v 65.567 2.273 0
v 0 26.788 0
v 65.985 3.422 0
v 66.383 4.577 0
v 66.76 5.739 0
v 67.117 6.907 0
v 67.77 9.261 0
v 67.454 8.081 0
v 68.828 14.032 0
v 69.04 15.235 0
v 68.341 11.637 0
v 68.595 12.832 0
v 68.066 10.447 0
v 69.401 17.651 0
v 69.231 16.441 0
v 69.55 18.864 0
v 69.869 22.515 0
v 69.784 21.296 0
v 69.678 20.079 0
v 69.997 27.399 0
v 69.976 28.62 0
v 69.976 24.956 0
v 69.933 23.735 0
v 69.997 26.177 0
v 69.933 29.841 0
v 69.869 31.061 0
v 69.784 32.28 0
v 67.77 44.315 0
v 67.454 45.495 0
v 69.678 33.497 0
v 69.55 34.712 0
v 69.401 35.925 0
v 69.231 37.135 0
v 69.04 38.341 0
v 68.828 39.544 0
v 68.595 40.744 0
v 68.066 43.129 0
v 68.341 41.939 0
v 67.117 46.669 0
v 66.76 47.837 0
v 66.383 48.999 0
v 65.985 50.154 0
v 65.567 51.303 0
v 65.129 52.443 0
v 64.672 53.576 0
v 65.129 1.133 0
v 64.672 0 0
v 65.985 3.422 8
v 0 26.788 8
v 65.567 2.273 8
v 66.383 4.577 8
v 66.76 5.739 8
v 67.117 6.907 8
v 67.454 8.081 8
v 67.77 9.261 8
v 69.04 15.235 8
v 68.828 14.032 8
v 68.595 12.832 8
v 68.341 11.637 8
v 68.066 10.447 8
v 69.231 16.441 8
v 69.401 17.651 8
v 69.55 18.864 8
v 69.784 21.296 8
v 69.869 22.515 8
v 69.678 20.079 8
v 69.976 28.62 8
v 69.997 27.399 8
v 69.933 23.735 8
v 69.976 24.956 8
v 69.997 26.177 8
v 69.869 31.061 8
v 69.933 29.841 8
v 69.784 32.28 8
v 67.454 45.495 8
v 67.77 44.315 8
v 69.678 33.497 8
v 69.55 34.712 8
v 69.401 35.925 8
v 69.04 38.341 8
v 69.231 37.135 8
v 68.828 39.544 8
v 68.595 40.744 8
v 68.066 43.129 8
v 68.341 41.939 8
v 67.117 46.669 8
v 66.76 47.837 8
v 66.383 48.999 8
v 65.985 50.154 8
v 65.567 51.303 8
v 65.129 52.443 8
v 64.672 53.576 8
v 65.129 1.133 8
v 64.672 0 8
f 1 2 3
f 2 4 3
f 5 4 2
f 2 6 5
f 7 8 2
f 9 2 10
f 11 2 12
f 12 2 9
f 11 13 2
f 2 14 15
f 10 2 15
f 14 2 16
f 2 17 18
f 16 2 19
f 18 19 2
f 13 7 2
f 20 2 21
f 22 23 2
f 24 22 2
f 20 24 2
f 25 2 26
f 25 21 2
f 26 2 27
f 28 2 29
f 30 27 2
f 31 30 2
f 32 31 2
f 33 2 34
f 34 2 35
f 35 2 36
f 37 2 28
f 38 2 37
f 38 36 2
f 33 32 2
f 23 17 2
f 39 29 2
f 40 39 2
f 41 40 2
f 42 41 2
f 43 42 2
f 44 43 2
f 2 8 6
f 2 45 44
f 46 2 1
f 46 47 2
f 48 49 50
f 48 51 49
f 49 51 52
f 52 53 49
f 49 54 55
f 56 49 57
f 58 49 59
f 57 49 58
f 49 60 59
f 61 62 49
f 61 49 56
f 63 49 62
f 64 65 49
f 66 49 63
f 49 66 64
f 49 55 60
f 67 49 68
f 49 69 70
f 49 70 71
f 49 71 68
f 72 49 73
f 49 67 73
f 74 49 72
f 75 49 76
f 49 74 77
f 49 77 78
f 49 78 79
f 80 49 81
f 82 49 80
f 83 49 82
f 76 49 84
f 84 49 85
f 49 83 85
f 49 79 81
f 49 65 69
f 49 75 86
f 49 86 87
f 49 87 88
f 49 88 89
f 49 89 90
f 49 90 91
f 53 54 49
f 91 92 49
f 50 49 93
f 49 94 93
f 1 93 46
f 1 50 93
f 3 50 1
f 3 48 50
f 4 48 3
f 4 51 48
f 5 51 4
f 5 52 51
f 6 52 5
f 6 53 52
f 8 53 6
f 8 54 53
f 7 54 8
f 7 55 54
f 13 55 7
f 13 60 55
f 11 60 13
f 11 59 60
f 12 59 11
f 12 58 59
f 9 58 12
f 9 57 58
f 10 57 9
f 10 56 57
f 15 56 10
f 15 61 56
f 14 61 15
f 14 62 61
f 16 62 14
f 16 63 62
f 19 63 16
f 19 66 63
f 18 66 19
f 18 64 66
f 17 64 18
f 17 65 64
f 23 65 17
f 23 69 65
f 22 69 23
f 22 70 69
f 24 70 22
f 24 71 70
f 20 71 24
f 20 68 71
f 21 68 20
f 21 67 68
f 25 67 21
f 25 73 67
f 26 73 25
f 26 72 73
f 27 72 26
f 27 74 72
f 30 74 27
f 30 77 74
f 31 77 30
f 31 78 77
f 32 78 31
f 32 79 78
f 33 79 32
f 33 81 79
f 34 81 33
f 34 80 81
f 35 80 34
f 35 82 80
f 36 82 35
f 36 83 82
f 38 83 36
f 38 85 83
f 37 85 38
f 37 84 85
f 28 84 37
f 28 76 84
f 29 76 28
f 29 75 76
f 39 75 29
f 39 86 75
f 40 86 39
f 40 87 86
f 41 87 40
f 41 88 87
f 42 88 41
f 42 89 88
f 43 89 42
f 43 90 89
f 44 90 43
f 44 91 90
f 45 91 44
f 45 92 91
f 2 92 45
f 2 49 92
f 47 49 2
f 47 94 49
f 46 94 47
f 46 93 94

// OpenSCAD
$fn = 32;

// ----------------------------------------------------------------------
// Arc profile plate: sector, 47 points
// ----------------------------------------------------------------------

// --- parameters (mm) ---
sector_angle = 45;        // sector angle, degrees
sector_r = 70;            // outer radius
arc_step = 1;             // sampling step of the arc, degrees
plate_t = 8;              // plate thickness, Z
fit_tol = 0.1;            // declared fit tolerance (prompt contract)
free_tol = 0.5;           // declared free tolerance (prompt contract)

bbox_x = 2 * sector_r * sin(sector_angle / 2);  // chord of the sector
bbox_y = sector_r;  // depth of the sector (apex to arc)

profile = [[64.672, 0], [65.129, 1.133], [65.567, 2.273], [65.985, 3.422], [66.383, 4.577], [66.76, 5.739], [67.117, 6.907], [67.454, 8.081], [67.77, 9.261], [68.066, 10.447], [68.341, 11.637], [68.595, 12.832], [68.828, 14.032], [69.04, 15.235], [69.231, 16.441], [69.401, 17.651], [69.55, 18.864], [69.678, 20.079], [69.784, 21.296], [69.869, 22.515], [69.933, 23.735], [69.976, 24.956], [69.997, 26.177], [69.997, 27.399], [69.976, 28.62], [69.933, 29.841], [69.869, 31.061], [69.784, 32.28], [69.678, 33.497], [69.55, 34.712], [69.401, 35.925], [69.231, 37.135], [69.04, 38.341], [68.828, 39.544], [68.595, 40.744], [68.341, 41.939], [68.066, 43.129], [67.77, 44.315], [67.454, 45.495], [67.117, 46.669], [66.76, 47.837], [66.383, 48.999], [65.985, 50.154], [65.567, 51.303], [65.129, 52.443], [64.672, 53.576], [0, 26.788]];  // primary outline, 47 points, counter clockwise

// --- the one profile operation ---
linear_extrude(height = plate_t) polygon(points = profile);
